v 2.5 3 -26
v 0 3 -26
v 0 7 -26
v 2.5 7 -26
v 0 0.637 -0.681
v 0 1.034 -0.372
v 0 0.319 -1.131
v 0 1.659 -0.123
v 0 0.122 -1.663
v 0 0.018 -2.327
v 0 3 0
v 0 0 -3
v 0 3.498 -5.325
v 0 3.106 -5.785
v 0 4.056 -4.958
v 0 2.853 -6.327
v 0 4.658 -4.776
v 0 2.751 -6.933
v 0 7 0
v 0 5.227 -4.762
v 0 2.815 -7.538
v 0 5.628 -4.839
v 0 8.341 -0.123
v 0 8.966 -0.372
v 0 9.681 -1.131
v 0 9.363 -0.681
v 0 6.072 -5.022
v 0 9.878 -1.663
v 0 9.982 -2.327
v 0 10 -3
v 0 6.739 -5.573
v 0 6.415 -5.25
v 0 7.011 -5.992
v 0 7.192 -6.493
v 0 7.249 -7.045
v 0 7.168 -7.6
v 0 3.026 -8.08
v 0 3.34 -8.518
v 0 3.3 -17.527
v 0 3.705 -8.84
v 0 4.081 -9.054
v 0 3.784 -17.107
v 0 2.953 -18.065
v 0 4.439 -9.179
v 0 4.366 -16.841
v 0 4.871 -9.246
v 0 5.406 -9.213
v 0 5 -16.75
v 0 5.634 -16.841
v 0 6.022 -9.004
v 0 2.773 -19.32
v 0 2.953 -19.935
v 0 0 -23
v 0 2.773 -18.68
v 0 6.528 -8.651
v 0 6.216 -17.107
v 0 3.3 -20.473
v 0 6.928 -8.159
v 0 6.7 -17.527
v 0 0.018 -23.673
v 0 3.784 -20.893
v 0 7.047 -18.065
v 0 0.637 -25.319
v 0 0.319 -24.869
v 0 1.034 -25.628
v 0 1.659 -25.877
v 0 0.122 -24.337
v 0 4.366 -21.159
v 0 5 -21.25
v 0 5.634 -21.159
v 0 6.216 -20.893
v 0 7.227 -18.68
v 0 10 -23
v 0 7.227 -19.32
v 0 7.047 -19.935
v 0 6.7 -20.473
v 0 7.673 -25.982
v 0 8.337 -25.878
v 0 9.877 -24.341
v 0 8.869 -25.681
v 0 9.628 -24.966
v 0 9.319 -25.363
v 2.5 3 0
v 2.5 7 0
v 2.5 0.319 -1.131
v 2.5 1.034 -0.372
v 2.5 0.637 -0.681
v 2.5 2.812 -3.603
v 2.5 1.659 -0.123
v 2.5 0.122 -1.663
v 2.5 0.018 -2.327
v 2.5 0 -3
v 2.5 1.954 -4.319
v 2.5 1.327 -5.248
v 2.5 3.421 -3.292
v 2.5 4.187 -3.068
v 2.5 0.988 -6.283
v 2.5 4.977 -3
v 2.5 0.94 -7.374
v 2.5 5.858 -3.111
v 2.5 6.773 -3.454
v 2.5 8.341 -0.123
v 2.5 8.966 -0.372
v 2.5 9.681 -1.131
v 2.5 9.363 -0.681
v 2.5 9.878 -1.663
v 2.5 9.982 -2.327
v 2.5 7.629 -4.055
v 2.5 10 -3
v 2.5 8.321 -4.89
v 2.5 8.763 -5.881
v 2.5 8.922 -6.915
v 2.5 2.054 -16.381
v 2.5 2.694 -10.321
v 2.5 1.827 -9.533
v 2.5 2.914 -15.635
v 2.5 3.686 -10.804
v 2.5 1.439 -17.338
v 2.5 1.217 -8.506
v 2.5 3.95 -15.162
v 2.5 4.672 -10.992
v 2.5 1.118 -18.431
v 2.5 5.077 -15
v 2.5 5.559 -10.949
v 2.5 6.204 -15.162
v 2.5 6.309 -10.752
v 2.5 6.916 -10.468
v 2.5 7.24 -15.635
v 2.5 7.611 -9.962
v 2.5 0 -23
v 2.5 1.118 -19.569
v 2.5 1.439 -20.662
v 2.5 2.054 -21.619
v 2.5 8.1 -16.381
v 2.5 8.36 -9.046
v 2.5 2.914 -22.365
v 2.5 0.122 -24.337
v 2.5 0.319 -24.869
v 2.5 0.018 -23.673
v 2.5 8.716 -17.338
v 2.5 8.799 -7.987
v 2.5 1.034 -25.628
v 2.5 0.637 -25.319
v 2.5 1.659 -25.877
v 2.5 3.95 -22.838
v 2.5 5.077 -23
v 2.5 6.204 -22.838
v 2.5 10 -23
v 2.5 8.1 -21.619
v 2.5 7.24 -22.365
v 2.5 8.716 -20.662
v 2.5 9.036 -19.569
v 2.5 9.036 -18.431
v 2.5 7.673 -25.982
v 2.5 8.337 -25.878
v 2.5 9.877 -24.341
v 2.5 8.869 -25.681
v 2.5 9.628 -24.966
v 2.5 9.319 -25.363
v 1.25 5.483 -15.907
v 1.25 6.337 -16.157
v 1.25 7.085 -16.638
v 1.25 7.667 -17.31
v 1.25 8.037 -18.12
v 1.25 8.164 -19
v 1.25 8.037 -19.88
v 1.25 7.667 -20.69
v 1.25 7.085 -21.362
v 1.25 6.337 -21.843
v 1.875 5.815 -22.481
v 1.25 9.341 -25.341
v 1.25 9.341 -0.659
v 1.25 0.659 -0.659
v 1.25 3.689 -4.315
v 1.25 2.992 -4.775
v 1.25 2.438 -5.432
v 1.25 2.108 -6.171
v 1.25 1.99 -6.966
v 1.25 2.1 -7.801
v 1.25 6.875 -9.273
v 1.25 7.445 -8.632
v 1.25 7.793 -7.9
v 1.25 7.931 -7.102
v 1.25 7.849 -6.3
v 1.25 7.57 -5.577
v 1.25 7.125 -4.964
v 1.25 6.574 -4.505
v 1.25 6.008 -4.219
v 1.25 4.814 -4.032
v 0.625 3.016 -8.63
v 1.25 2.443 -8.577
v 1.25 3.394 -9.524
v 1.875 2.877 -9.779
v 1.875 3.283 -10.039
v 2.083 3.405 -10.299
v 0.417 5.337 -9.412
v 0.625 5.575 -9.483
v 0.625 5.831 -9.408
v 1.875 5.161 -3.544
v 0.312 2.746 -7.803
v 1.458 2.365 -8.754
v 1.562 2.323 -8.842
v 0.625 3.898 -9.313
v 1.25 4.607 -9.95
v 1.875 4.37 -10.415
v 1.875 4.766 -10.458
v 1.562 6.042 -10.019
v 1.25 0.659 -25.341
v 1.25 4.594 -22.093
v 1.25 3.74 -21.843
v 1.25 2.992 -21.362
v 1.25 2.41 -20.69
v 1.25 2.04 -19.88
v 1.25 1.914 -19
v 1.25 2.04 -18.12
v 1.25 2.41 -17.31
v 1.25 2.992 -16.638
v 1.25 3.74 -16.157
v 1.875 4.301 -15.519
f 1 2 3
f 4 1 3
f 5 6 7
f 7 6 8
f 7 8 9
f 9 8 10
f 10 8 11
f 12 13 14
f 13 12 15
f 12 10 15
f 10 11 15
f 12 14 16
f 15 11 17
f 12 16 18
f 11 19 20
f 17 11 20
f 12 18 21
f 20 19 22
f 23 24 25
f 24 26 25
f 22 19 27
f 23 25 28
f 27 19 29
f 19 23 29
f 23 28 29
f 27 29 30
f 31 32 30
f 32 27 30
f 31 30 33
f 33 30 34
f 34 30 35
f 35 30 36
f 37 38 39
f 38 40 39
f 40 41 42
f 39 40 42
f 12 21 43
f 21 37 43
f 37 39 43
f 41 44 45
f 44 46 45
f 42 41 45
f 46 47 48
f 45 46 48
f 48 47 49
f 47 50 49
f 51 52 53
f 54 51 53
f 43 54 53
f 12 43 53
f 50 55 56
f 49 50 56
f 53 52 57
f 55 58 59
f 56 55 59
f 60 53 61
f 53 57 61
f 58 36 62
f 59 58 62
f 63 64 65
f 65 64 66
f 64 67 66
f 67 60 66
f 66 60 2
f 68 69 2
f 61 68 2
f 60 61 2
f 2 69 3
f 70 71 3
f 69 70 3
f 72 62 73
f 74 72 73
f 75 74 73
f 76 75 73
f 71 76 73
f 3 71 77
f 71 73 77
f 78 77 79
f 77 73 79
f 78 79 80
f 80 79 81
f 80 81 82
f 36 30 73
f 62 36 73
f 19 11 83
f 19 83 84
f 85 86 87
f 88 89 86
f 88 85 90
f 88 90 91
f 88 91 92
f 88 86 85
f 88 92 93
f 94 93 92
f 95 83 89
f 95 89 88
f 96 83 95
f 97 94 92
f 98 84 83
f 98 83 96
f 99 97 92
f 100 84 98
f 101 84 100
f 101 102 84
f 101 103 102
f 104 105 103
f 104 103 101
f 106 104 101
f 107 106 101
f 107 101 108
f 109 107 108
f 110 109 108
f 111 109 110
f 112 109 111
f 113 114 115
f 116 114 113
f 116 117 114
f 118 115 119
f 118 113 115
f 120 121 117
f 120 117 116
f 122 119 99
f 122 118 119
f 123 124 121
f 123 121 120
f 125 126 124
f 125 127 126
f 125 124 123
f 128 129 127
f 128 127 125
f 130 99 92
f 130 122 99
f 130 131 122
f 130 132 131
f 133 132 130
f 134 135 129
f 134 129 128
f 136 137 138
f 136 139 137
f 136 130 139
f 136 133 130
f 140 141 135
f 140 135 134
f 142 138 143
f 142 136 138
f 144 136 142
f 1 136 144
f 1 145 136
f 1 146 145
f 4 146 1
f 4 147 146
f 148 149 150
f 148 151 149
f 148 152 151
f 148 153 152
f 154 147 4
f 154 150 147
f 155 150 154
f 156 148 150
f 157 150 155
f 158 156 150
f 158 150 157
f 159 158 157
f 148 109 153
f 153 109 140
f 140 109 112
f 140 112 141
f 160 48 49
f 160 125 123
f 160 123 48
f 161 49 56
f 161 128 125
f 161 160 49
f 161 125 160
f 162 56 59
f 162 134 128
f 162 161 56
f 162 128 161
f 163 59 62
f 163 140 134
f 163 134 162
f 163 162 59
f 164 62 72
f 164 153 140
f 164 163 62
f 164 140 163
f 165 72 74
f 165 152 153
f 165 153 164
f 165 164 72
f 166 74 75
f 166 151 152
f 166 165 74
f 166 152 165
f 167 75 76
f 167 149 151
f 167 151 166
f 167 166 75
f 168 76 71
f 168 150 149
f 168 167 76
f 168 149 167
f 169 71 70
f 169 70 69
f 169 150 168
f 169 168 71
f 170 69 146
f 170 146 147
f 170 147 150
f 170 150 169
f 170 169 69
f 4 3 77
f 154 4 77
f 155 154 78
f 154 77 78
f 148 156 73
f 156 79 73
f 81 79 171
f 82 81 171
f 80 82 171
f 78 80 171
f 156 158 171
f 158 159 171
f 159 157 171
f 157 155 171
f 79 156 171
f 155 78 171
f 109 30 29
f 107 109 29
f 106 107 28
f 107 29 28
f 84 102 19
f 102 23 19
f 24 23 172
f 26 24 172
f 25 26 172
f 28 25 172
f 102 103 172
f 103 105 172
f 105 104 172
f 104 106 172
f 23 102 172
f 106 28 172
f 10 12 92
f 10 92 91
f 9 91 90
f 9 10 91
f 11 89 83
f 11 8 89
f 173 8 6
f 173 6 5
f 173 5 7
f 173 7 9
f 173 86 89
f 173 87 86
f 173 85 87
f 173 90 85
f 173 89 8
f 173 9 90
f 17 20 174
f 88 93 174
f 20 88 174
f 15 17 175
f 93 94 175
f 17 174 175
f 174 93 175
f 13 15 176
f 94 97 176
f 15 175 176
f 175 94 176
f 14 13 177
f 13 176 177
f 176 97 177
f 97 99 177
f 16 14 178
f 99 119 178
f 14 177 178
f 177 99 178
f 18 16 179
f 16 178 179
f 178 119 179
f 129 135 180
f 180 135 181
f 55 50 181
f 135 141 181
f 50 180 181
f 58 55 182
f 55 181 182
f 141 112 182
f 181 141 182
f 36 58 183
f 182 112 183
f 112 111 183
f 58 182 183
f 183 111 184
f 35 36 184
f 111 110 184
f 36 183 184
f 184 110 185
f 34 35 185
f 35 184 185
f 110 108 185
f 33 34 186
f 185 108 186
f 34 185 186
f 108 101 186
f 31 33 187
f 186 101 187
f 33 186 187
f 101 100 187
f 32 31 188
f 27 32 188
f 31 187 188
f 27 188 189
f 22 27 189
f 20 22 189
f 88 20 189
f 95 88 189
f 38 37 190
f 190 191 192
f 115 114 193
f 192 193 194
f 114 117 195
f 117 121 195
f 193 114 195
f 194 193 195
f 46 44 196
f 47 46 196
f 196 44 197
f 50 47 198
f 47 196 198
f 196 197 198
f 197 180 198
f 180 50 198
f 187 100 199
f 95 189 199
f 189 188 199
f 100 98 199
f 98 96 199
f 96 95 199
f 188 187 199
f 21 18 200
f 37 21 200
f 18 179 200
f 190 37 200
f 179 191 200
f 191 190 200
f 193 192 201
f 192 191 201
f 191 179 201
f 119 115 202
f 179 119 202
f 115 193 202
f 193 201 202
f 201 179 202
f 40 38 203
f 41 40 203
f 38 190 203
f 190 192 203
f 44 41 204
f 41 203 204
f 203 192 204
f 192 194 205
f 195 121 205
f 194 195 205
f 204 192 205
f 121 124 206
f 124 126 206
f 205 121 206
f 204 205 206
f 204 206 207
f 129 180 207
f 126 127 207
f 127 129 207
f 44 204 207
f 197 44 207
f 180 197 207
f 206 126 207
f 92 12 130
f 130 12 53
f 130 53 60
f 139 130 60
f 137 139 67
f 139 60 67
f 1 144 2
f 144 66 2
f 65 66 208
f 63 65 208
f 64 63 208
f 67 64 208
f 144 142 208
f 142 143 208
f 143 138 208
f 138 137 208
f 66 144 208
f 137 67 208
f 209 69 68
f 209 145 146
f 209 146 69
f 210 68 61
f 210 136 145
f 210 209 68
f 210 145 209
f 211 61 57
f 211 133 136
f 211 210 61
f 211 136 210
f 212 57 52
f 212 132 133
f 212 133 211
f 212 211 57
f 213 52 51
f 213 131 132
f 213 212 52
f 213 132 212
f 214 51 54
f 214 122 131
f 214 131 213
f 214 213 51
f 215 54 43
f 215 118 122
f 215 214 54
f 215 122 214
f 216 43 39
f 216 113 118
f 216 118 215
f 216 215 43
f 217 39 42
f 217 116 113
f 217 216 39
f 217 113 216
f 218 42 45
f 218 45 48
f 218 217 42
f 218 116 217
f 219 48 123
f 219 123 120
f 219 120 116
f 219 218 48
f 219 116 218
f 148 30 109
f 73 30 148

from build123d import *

# Parameters (mm, degrees)
SKETCH1_W           = 26
SKETCH1_H           = 10
BOSS_EXTRUDE1_DEPTH = 2.5
FILLET1_SIZE        = 3
SKETCH4_5_R         = 2.25
SKETCH3_6_R         = 4


with BuildPart() as part:
    # Sketch1 → Boss-Extrude1 (new body)
    with BuildSketch(Plane(origin=(0, 0, 0), x_dir=(0, 0, -1), z_dir=(1, 0, 0))):
        with Locations((13, 5)):
            Rectangle(SKETCH1_W, SKETCH1_H)
    extrude(amount=BOSS_EXTRUDE1_DEPTH)

    # Fillet1
    # a fillet whose section is not a circle: 3 mm, written as the material it takes off along each edge
    with BuildSketch(Plane(origin=(-7.5, 10, 0), x_dir=(0, 0, -1), z_dir=(1, 0, 0)), Plane(origin=(-7.5, 0, -26), x_dir=(0, 0, 1), z_dir=(1, 0, 0)), Plane(origin=(-7.5, 10, -26), x_dir=(0, -1, 0), z_dir=(1, 0, 0))) as fillet1_piece_1:
        with BuildLine():
            add(Edge.make_bspline([(FILLET1_SIZE, 0), (FILLET1_SIZE * 0.831801948466, 0), (FILLET1_SIZE * 0.663603896932, 0), (FILLET1_SIZE * 0.292893218813, -FILLET1_SIZE * 0.0716919198361), (FILLET1_SIZE * 0.0716919198361, -FILLET1_SIZE * 0.292893218813), (0, -FILLET1_SIZE * 0.663603896932), (0, -FILLET1_SIZE * 0.831801948466), (0, -FILLET1_SIZE)], knots=[0, 0, 0, 0, 0, 0, 0.5, 0.5, 1, 1, 1, 1, 1, 1], degree=5))
            Line((0, -FILLET1_SIZE), (0, 0))
            Line((0, 0), (FILLET1_SIZE, 0))
        make_face()
    extrude(amount=17.5, mode=Mode.SUBTRACT)
    with BuildSketch(Plane(origin=(-7.5, 0, 0), x_dir=(0, 0, -1), z_dir=(1, 0, 0))) as fillet1_piece_2:
        with BuildLine():
            add(Edge.make_bspline([(FILLET1_SIZE, 0), (FILLET1_SIZE * 0.831801948466, 0), (FILLET1_SIZE * 0.663603896932, 0), (FILLET1_SIZE * 0.292893218813, FILLET1_SIZE * 0.0716919198361), (FILLET1_SIZE * 0.0716919198361, FILLET1_SIZE * 0.292893218813), (0, FILLET1_SIZE * 0.663603896932), (0, FILLET1_SIZE * 0.831801948466), (0, FILLET1_SIZE)], knots=[0, 0, 0, 0, 0, 0, 0.5, 0.5, 1, 1, 1, 1, 1, 1], degree=5))
            Line((0, FILLET1_SIZE), (0, 0))
            Line((0, 0), (FILLET1_SIZE, 0))
        make_face()
    extrude(amount=17.5, mode=Mode.SUBTRACT)

    # Cut-Loft1: read off the stored shape, not the designer's step
    # Cut-Loft1: loft between two sections, ruled curve by curve
    cut_loft1_from = [
        Edge.make_bspline([(0, 5.227220393, -4.761502537), (0, 5.040678937, -4.742567504), (0, 4.827360743, -4.743831636), (0, 4.355343831, -4.831009815), (0, 4.09562853, -4.918026839), (0, 3.710202489, -5.150291271), (0, 3.582651152, -5.2453356), (0, 3.342613634, -5.469976954), (0, 3.230127455, -5.599573979), (0, 3.033437391, -5.892627716), (0, 2.949592094, -6.055325315), (0, 2.823029016, -6.402187173), (0, 2.780437569, -6.586238152), (0, 2.742567504, -6.959321063), (0, 2.747306812, -7.148176386), (0, 2.801589604, -7.513395142), (0, 2.851032094, -7.68962222), (0, 2.984823778, -8.016221759), (0, 3.068974238, -8.165778536), (0, 3.258976095, -8.434071364), (0, 3.364827492, -8.552807416), (0, 3.695720639, -8.857782374), (0, 3.932653309, -8.995212029), (0, 4.377524958, -9.175459681), (0, 4.586238152, -9.219562431), (0, 4.959321063, -9.257432496), (0, 5.172639257, -9.256168364), (0, 5.644656169, -9.168990185), (0, 5.90437147, -9.081973161), (0, 6.289797511, -8.849708729), (0, 6.417348848, -8.7546644), (0, 6.657386366, -8.530023046), (0, 6.769872545, -8.400426021), (0, 6.966562609, -8.107372284), (0, 7.050407906, -7.944674685), (0, 7.176970984, -7.597812827), (0, 7.219562431, -7.413761848), (0, 7.257432496, -7.040678937), (0, 7.252693188, -6.851823614), (0, 7.198410396, -6.486604858), (0, 7.148967906, -6.31037778), (0, 7.015176222, -5.983778241), (0, 6.931025762, -5.834221464), (0, 6.741023905, -5.565928636), (0, 6.635172508, -5.447192584), (0, 6.304279361, -5.142217626), (0, 6.067346691, -5.004787971), (0, 5.622475042, -4.824540319), (0, 5.413761848, -4.780437569), (0, 5.227220393, -4.761502537)], [0, 0, 0, 0, 0.0625, 0.0625, 0.125, 0.125, 0.15625, 0.15625, 0.1875, 0.1875, 0.21875, 0.21875, 0.25, 0.25, 0.28125, 0.28125, 0.3125, 0.3125, 0.34375, 0.34375, 0.375, 0.375, 0.4375, 0.4375, 0.5, 0.5, 0.5625, 0.5625, 0.625, 0.625, 0.65625, 0.65625, 0.6875, 0.6875, 0.71875, 0.71875, 0.75, 0.75, 0.78125, 0.78125, 0.8125, 0.8125, 0.84375, 0.84375, 0.875, 0.875, 0.9375, 0.9375, 1, 1, 1, 1], 3),
    ]
    cut_loft1_to = [
        Edge.make_bspline([(2.5, 2.811561531, -3.602638399), (2.5, 2.528448064, -3.778586903), (2.5, 2.229585449, -4.012046448), (2.5, 1.65992568, -4.647393225), (2.5, 1.388895654, -5.051936935), (2.5, 1.098683643, -5.797441454), (2.5, 1.021967094, -6.068450115), (2.5, 0.927996054, -6.645321276), (2.5, 0.910956437, -6.951185481), (2.5, 0.952403615, -7.577266038), (2.5, 1.011097599, -7.897318025), (2.5, 1.209685139, -8.522967618), (2.5, 1.349633474, -8.828268581), (2.5, 1.701530482, -9.394495515), (2.5, 1.913312576, -9.655153449), (2.5, 2.386369409, -10.110226694), (2.5, 2.647353909, -10.30455978), (2.5, 3.19037235, -10.618925341), (2.5, 3.472167179, -10.739070815), (2.5, 4.031019985, -10.910226979), (2.5, 4.307984356, -10.961431088), (2.5, 5.104928058, -11.031293352), (2.5, 5.587659325, -10.967391766), (2.5, 6.409558868, -10.737916455), (2.5, 6.75121216, -10.573310105), (2.5, 7.317439093, -10.221413097), (2.5, 7.616301709, -9.987953552), (2.5, 8.185961477, -9.352606775), (2.5, 8.456991504, -8.948063065), (2.5, 8.747203514, -8.202558546), (2.5, 8.823920064, -7.931549885), (2.5, 8.917891104, -7.354678724), (2.5, 8.934930721, -7.048814519), (2.5, 8.893483543, -6.422733962), (2.5, 8.834789558, -6.102681975), (2.5, 8.636202018, -5.477032382), (2.5, 8.496253684, -5.171731419), (2.5, 8.144356676, -4.605504485), (2.5, 7.932574581, -4.344846551), (2.5, 7.459517749, -3.889773306), (2.5, 7.198533248, -3.69544022), (2.5, 6.655514807, -3.381074659), (2.5, 6.373719979, -3.260929185), (2.5, 5.814867172, -3.089773021), (2.5, 5.537902802, -3.038568912), (2.5, 4.7409591, -2.968706648), (2.5, 4.258227833, -3.032608234), (2.5, 3.436328289, -3.262083545), (2.5, 3.094674998, -3.426689895), (2.5, 2.811561531, -3.602638399)], [0, 0, 0, 0, 0.0625, 0.0625, 0.125, 0.125, 0.15625, 0.15625, 0.1875, 0.1875, 0.21875, 0.21875, 0.25, 0.25, 0.28125, 0.28125, 0.3125, 0.3125, 0.34375, 0.34375, 0.375, 0.375, 0.4375, 0.4375, 0.5, 0.5, 0.5625, 0.5625, 0.625, 0.625, 0.65625, 0.65625, 0.6875, 0.6875, 0.71875, 0.71875, 0.75, 0.75, 0.78125, 0.78125, 0.8125, 0.8125, 0.84375, 0.84375, 0.875, 0.875, 0.9375, 0.9375, 1, 1, 1, 1], 3),
    ]
    cut_loft1 = Solid(Shell([*[Face.make_surface_from_curves(cut_loft1_from[k], cut_loft1_to[k]) for k in range(1)], Face(Wire(cut_loft1_from)), Face(Wire(cut_loft1_to))]))
    add(cut_loft1, mode=Mode.SUBTRACT)

    # Sketch4<5> → Cut-Loft2 section 0
    with BuildSketch(Plane.ZY):
        with Locations((-19, 5)):
            Circle(SKETCH4_5_R)
    # Sketch3<6> → Cut-Loft2 section 1
    with BuildSketch(Plane(origin=(2.5, 0, 0), x_dir=(0, 0, -1), z_dir=(1, 0, 0))):
        with Locations((19, 5.077056421)):
            Circle(SKETCH3_6_R)
    loft(mode=Mode.SUBTRACT)


solid = part.part
